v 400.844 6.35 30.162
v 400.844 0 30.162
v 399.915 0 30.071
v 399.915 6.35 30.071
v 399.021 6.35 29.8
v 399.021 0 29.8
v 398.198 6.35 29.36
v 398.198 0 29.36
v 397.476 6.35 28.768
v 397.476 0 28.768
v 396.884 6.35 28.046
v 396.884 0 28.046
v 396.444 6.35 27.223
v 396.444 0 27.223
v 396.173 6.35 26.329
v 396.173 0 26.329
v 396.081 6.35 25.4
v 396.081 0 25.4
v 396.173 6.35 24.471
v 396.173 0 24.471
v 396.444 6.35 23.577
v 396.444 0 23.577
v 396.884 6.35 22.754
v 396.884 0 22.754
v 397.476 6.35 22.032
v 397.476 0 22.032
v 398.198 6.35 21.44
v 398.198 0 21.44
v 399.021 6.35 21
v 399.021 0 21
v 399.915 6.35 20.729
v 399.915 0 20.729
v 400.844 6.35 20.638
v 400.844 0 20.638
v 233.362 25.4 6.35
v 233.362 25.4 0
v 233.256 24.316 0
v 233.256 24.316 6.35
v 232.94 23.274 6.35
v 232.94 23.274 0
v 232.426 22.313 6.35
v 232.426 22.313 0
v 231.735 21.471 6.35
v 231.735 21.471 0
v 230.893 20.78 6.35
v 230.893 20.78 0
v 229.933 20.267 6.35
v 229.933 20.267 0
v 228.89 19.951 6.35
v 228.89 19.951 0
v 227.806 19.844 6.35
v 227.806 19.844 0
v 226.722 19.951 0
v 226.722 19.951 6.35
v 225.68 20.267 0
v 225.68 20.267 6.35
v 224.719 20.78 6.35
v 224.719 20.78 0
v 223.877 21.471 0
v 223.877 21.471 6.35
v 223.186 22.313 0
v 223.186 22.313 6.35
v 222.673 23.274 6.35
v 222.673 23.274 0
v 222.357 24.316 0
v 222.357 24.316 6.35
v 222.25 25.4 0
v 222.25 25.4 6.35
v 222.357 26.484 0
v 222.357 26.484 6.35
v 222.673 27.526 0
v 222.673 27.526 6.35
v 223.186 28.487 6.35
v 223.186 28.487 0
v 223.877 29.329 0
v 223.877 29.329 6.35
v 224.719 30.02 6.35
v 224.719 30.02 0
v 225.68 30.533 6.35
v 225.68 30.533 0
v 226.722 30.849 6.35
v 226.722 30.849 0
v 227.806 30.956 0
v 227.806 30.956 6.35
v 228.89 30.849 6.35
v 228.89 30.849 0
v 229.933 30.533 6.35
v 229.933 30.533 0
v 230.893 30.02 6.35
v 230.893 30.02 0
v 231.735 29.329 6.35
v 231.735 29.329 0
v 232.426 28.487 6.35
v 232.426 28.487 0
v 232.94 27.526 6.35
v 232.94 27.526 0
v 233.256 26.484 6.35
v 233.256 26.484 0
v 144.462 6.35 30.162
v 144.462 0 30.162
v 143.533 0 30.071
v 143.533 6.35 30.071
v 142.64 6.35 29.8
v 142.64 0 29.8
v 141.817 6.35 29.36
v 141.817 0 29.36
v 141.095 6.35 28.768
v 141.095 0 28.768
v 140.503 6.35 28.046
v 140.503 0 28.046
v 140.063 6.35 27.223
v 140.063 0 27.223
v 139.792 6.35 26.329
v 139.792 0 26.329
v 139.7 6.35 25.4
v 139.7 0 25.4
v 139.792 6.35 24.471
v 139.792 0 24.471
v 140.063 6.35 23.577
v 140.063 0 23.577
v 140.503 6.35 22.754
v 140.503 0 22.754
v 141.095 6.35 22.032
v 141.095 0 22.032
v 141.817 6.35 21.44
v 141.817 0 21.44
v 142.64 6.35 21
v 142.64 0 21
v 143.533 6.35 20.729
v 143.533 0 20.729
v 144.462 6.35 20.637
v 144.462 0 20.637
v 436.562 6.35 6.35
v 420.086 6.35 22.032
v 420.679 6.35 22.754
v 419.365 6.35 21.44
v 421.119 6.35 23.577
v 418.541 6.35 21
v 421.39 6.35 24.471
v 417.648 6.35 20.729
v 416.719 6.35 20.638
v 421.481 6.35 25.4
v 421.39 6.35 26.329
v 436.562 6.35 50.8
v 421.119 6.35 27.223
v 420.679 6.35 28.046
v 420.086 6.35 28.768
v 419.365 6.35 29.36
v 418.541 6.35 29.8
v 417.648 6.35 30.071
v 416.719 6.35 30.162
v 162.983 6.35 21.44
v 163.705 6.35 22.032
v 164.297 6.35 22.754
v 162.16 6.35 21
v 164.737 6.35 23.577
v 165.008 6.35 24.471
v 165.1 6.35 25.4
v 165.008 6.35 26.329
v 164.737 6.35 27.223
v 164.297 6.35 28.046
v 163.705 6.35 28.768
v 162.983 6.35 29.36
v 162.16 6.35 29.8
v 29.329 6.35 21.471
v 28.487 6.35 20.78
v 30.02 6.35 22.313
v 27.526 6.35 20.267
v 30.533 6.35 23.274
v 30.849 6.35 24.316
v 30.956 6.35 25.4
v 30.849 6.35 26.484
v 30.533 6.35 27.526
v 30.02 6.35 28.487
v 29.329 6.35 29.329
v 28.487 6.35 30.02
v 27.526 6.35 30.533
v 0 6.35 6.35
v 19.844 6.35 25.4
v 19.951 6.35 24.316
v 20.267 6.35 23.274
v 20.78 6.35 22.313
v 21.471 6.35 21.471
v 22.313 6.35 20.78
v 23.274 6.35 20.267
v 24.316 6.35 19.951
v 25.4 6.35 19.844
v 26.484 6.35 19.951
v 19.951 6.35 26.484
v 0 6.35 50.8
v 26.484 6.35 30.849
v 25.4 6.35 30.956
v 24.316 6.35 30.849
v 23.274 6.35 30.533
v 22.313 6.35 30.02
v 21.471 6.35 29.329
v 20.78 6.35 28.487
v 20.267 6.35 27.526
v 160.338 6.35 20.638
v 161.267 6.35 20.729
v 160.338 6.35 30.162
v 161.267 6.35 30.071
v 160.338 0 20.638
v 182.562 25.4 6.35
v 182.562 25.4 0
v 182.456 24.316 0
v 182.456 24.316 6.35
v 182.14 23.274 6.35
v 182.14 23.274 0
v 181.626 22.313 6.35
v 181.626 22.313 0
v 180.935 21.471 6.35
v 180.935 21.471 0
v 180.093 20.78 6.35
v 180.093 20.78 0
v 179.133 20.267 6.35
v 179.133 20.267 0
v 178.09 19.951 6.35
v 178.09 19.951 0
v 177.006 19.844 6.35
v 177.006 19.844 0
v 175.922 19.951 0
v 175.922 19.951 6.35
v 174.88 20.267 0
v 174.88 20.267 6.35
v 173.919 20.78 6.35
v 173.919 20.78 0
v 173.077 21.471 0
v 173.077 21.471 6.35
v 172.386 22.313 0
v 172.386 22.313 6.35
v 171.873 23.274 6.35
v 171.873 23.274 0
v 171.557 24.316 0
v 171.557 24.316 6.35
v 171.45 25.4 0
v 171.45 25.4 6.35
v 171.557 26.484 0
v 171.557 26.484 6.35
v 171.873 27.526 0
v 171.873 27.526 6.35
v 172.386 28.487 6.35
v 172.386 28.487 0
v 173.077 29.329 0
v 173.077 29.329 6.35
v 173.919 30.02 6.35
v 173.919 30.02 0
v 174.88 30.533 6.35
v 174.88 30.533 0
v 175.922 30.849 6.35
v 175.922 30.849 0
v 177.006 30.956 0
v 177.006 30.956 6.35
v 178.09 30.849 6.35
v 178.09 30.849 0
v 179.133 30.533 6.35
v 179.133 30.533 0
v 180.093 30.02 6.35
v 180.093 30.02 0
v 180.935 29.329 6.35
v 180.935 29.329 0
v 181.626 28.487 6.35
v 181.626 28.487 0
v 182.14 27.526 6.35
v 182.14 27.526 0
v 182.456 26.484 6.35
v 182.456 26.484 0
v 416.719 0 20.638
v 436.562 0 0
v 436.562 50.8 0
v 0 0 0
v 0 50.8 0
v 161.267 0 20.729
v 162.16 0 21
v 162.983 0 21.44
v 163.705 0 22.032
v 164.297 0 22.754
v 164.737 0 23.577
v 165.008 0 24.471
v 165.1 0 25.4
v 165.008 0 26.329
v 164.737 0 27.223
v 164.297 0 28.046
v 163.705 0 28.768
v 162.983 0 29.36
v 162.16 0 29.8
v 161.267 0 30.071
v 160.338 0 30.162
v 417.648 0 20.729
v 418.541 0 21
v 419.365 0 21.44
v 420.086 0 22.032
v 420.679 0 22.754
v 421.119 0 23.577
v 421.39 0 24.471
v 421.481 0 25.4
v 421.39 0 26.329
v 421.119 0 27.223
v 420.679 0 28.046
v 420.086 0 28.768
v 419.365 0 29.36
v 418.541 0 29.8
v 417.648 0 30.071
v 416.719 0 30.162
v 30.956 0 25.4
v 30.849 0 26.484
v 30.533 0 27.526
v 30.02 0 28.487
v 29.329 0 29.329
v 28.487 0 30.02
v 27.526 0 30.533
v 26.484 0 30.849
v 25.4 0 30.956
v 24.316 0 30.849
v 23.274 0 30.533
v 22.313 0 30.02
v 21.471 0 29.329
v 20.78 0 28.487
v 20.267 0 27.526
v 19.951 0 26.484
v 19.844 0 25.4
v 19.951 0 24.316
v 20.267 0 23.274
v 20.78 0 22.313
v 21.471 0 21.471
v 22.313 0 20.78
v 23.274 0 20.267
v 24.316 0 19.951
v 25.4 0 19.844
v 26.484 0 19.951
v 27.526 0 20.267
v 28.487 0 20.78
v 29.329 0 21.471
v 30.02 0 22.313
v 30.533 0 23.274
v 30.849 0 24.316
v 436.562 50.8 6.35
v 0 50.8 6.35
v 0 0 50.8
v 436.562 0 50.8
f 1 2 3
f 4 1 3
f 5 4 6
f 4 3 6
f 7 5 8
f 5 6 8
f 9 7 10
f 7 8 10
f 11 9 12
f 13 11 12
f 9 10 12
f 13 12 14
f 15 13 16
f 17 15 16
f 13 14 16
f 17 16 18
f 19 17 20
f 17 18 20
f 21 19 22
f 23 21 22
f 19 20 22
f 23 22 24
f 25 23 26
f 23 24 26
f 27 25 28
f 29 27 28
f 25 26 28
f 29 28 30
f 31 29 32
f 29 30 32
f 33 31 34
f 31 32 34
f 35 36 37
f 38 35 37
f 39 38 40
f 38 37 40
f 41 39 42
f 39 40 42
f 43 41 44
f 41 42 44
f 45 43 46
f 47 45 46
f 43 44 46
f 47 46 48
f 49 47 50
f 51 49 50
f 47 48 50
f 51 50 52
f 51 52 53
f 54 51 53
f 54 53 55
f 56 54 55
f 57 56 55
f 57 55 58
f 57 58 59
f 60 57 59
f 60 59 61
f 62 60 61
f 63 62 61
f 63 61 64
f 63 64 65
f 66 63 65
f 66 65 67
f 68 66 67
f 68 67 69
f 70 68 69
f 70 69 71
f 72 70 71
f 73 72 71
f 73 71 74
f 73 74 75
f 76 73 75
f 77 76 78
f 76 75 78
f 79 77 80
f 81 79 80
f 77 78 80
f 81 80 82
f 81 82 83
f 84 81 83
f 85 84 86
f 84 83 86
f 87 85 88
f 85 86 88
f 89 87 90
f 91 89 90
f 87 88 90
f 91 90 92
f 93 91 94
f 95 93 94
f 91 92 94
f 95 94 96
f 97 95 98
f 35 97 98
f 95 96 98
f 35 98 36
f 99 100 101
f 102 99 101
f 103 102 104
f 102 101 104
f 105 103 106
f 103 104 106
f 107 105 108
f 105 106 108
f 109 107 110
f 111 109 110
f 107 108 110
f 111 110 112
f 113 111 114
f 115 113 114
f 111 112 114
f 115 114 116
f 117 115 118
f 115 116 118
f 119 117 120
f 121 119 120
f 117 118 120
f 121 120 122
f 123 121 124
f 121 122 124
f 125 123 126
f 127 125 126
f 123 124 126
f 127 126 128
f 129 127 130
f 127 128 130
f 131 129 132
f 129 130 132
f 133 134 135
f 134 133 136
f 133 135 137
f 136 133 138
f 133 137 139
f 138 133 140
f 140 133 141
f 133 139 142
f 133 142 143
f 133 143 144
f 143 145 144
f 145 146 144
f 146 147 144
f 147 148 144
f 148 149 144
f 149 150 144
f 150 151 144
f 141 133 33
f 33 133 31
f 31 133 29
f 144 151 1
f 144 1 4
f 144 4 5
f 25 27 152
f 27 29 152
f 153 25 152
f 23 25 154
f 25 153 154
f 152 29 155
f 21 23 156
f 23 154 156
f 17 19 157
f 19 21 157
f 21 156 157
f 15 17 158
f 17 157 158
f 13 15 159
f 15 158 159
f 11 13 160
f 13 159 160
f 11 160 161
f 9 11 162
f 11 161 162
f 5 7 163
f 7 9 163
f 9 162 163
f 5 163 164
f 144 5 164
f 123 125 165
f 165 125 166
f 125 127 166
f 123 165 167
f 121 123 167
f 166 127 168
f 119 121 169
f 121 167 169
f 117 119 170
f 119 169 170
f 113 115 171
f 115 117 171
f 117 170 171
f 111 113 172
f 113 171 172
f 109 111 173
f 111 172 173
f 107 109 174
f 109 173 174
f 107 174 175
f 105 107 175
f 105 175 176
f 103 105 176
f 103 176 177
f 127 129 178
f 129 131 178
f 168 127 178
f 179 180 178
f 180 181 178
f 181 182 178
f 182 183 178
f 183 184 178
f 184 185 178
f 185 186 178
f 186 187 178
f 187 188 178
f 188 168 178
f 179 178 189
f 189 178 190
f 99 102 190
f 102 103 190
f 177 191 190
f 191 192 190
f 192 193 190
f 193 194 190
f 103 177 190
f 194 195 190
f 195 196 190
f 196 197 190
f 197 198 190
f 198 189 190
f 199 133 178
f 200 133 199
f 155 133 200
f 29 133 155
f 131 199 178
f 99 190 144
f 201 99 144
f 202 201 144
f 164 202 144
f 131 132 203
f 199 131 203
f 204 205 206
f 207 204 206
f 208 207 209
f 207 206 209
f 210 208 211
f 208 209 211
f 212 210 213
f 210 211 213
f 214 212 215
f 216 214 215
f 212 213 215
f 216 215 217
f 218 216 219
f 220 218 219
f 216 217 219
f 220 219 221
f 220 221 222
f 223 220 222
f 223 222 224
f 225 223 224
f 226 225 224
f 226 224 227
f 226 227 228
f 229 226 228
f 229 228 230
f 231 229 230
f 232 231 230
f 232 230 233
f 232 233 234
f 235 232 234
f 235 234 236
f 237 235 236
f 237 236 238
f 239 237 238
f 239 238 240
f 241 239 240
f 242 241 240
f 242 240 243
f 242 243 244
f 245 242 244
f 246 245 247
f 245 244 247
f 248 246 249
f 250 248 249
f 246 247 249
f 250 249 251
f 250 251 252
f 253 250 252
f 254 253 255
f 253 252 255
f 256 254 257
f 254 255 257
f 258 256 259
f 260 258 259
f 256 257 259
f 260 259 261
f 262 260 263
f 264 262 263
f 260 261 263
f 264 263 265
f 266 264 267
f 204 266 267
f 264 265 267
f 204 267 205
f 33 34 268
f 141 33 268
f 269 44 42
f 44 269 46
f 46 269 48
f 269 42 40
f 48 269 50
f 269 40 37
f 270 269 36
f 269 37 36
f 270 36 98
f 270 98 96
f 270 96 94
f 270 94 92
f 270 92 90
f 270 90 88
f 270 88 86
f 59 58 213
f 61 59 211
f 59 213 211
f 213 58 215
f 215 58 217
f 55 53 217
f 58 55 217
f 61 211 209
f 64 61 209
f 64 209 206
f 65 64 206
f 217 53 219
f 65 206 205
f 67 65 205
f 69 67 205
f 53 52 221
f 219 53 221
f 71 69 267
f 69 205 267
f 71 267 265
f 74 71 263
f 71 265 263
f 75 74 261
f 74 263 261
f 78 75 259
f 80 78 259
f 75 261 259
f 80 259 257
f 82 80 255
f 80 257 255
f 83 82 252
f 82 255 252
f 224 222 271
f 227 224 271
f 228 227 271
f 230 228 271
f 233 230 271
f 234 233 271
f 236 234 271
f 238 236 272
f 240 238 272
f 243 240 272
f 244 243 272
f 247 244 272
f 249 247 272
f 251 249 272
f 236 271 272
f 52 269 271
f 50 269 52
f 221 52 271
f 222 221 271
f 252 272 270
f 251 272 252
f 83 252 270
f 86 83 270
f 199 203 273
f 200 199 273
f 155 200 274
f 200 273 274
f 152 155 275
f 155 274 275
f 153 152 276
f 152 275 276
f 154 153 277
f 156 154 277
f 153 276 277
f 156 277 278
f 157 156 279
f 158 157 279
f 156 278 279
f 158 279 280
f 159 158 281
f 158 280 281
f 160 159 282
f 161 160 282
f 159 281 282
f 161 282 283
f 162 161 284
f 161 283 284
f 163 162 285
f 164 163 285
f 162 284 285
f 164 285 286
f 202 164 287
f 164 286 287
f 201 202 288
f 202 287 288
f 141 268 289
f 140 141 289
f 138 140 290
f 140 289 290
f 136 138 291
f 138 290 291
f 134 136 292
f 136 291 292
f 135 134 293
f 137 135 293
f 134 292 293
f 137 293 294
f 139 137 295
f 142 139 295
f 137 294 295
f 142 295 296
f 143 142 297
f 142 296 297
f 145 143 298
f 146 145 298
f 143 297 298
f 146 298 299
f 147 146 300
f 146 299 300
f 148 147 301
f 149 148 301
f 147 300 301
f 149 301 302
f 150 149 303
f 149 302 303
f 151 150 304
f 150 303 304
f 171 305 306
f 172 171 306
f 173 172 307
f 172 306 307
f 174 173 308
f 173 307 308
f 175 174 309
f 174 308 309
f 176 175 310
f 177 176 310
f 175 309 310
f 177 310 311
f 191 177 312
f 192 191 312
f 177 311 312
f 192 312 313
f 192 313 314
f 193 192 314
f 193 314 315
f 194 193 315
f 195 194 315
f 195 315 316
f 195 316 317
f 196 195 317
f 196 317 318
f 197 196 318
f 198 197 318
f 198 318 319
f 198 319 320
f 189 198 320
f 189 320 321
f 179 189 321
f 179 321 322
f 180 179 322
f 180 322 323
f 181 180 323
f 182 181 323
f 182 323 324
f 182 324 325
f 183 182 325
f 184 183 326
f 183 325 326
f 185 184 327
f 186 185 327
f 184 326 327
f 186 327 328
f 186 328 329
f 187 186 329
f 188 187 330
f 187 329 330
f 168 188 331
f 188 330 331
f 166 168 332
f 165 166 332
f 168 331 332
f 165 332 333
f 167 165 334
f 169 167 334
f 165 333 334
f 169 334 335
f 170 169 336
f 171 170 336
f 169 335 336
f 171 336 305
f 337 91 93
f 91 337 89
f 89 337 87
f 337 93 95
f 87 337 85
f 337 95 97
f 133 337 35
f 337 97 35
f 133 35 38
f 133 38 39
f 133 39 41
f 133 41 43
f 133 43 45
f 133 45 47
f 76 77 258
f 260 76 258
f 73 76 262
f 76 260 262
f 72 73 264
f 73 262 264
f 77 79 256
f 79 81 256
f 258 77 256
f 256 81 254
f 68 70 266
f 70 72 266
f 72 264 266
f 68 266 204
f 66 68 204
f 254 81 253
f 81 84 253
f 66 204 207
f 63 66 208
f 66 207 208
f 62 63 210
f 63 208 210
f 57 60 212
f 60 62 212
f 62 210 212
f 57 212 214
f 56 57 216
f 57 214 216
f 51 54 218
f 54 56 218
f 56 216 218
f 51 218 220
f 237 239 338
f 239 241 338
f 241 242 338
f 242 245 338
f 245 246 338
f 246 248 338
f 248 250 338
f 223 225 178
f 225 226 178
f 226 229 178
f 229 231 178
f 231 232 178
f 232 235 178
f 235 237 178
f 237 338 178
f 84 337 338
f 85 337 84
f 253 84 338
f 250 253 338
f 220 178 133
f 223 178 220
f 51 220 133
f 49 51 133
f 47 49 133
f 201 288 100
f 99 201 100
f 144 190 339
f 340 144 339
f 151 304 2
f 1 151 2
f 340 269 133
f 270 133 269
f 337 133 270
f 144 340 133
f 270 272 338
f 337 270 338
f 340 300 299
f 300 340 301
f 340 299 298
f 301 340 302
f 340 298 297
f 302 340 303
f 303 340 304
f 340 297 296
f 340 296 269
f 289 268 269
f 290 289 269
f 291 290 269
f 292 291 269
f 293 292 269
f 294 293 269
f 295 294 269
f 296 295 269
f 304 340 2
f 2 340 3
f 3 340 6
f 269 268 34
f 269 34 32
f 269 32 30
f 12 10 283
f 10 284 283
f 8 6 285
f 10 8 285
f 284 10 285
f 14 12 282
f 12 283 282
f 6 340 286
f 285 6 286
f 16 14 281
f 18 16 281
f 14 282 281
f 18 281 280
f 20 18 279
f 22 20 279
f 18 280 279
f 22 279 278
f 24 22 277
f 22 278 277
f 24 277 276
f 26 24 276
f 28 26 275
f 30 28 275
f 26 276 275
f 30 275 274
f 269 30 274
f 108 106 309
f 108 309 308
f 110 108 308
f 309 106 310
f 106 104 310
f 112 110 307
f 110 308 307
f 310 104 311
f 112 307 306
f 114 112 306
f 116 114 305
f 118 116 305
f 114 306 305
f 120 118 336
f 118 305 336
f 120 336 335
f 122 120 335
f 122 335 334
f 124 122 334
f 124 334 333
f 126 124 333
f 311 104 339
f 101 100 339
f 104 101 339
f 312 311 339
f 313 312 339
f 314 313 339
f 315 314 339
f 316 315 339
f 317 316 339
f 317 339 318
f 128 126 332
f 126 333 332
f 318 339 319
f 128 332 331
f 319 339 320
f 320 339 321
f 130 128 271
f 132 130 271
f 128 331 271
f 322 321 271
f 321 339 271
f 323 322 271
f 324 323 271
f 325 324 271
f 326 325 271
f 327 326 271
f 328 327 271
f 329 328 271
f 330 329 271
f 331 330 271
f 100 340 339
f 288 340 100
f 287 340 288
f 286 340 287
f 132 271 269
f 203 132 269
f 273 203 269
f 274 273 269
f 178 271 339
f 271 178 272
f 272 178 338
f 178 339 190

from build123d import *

# Parameters (mm, degrees)
F1_DEPTH = 436.5625
F2_R     = 5.55625
F3_DEPTH = 50.801
F4_R     = 5.55625
F5_DEPTH = 50.801


with BuildPart() as f1:
    # F0 (on Right) → F1 (new body)
    with BuildSketch(Plane.YZ):
        Polygon((0, 50.8), (0, 0), (50.8, 0), (50.8, 6.35), (6.35, 6.35), (6.35, 50.8), align=None)
    extrude(amount=F1_DEPTH)

    # F2 (on face) → F3 (cut, through all)
    with BuildSketch(Plane.XZ):
        with Locations((25.4, 25.4)):
            Circle(F2_R)
        with BuildLine():
            ThreePointArc((144.4625, 30.1625), (139.7, 25.4), (144.4625, 20.6375))
            Line((144.4625, 20.6375), (160.3375, 20.6375))
            ThreePointArc((160.3375, 20.6375), (165.1, 25.4), (160.3375, 30.1625))
            Line((160.3375, 30.1625), (144.4625, 30.1625))
        make_face()
        with BuildLine():
            ThreePointArc((400.84375, 30.1625), (396.08125, 25.4), (400.84375, 20.6375))
            Line((400.84375, 20.6375), (416.71875, 20.6375))
            ThreePointArc((416.71875, 20.6375), (421.48125, 25.4), (416.71875, 30.1625))
            Line((416.71875, 30.1625), (400.84375, 30.1625))
        make_face()
    extrude(amount=-F3_DEPTH, mode=Mode.SUBTRACT)

    # F4 (on face) → F5 (cut, through all)
    with BuildSketch(Plane(origin=(0, 0, 0), x_dir=(1, 0, 0), z_dir=(0, 0, -1))):
        with Locations((227.80625, -25.4)):
            Circle(F4_R)
        with Locations((177.00625, -25.4)):
            Circle(F4_R)
    extrude(amount=-F5_DEPTH, mode=Mode.SUBTRACT)


solid = f1.part
